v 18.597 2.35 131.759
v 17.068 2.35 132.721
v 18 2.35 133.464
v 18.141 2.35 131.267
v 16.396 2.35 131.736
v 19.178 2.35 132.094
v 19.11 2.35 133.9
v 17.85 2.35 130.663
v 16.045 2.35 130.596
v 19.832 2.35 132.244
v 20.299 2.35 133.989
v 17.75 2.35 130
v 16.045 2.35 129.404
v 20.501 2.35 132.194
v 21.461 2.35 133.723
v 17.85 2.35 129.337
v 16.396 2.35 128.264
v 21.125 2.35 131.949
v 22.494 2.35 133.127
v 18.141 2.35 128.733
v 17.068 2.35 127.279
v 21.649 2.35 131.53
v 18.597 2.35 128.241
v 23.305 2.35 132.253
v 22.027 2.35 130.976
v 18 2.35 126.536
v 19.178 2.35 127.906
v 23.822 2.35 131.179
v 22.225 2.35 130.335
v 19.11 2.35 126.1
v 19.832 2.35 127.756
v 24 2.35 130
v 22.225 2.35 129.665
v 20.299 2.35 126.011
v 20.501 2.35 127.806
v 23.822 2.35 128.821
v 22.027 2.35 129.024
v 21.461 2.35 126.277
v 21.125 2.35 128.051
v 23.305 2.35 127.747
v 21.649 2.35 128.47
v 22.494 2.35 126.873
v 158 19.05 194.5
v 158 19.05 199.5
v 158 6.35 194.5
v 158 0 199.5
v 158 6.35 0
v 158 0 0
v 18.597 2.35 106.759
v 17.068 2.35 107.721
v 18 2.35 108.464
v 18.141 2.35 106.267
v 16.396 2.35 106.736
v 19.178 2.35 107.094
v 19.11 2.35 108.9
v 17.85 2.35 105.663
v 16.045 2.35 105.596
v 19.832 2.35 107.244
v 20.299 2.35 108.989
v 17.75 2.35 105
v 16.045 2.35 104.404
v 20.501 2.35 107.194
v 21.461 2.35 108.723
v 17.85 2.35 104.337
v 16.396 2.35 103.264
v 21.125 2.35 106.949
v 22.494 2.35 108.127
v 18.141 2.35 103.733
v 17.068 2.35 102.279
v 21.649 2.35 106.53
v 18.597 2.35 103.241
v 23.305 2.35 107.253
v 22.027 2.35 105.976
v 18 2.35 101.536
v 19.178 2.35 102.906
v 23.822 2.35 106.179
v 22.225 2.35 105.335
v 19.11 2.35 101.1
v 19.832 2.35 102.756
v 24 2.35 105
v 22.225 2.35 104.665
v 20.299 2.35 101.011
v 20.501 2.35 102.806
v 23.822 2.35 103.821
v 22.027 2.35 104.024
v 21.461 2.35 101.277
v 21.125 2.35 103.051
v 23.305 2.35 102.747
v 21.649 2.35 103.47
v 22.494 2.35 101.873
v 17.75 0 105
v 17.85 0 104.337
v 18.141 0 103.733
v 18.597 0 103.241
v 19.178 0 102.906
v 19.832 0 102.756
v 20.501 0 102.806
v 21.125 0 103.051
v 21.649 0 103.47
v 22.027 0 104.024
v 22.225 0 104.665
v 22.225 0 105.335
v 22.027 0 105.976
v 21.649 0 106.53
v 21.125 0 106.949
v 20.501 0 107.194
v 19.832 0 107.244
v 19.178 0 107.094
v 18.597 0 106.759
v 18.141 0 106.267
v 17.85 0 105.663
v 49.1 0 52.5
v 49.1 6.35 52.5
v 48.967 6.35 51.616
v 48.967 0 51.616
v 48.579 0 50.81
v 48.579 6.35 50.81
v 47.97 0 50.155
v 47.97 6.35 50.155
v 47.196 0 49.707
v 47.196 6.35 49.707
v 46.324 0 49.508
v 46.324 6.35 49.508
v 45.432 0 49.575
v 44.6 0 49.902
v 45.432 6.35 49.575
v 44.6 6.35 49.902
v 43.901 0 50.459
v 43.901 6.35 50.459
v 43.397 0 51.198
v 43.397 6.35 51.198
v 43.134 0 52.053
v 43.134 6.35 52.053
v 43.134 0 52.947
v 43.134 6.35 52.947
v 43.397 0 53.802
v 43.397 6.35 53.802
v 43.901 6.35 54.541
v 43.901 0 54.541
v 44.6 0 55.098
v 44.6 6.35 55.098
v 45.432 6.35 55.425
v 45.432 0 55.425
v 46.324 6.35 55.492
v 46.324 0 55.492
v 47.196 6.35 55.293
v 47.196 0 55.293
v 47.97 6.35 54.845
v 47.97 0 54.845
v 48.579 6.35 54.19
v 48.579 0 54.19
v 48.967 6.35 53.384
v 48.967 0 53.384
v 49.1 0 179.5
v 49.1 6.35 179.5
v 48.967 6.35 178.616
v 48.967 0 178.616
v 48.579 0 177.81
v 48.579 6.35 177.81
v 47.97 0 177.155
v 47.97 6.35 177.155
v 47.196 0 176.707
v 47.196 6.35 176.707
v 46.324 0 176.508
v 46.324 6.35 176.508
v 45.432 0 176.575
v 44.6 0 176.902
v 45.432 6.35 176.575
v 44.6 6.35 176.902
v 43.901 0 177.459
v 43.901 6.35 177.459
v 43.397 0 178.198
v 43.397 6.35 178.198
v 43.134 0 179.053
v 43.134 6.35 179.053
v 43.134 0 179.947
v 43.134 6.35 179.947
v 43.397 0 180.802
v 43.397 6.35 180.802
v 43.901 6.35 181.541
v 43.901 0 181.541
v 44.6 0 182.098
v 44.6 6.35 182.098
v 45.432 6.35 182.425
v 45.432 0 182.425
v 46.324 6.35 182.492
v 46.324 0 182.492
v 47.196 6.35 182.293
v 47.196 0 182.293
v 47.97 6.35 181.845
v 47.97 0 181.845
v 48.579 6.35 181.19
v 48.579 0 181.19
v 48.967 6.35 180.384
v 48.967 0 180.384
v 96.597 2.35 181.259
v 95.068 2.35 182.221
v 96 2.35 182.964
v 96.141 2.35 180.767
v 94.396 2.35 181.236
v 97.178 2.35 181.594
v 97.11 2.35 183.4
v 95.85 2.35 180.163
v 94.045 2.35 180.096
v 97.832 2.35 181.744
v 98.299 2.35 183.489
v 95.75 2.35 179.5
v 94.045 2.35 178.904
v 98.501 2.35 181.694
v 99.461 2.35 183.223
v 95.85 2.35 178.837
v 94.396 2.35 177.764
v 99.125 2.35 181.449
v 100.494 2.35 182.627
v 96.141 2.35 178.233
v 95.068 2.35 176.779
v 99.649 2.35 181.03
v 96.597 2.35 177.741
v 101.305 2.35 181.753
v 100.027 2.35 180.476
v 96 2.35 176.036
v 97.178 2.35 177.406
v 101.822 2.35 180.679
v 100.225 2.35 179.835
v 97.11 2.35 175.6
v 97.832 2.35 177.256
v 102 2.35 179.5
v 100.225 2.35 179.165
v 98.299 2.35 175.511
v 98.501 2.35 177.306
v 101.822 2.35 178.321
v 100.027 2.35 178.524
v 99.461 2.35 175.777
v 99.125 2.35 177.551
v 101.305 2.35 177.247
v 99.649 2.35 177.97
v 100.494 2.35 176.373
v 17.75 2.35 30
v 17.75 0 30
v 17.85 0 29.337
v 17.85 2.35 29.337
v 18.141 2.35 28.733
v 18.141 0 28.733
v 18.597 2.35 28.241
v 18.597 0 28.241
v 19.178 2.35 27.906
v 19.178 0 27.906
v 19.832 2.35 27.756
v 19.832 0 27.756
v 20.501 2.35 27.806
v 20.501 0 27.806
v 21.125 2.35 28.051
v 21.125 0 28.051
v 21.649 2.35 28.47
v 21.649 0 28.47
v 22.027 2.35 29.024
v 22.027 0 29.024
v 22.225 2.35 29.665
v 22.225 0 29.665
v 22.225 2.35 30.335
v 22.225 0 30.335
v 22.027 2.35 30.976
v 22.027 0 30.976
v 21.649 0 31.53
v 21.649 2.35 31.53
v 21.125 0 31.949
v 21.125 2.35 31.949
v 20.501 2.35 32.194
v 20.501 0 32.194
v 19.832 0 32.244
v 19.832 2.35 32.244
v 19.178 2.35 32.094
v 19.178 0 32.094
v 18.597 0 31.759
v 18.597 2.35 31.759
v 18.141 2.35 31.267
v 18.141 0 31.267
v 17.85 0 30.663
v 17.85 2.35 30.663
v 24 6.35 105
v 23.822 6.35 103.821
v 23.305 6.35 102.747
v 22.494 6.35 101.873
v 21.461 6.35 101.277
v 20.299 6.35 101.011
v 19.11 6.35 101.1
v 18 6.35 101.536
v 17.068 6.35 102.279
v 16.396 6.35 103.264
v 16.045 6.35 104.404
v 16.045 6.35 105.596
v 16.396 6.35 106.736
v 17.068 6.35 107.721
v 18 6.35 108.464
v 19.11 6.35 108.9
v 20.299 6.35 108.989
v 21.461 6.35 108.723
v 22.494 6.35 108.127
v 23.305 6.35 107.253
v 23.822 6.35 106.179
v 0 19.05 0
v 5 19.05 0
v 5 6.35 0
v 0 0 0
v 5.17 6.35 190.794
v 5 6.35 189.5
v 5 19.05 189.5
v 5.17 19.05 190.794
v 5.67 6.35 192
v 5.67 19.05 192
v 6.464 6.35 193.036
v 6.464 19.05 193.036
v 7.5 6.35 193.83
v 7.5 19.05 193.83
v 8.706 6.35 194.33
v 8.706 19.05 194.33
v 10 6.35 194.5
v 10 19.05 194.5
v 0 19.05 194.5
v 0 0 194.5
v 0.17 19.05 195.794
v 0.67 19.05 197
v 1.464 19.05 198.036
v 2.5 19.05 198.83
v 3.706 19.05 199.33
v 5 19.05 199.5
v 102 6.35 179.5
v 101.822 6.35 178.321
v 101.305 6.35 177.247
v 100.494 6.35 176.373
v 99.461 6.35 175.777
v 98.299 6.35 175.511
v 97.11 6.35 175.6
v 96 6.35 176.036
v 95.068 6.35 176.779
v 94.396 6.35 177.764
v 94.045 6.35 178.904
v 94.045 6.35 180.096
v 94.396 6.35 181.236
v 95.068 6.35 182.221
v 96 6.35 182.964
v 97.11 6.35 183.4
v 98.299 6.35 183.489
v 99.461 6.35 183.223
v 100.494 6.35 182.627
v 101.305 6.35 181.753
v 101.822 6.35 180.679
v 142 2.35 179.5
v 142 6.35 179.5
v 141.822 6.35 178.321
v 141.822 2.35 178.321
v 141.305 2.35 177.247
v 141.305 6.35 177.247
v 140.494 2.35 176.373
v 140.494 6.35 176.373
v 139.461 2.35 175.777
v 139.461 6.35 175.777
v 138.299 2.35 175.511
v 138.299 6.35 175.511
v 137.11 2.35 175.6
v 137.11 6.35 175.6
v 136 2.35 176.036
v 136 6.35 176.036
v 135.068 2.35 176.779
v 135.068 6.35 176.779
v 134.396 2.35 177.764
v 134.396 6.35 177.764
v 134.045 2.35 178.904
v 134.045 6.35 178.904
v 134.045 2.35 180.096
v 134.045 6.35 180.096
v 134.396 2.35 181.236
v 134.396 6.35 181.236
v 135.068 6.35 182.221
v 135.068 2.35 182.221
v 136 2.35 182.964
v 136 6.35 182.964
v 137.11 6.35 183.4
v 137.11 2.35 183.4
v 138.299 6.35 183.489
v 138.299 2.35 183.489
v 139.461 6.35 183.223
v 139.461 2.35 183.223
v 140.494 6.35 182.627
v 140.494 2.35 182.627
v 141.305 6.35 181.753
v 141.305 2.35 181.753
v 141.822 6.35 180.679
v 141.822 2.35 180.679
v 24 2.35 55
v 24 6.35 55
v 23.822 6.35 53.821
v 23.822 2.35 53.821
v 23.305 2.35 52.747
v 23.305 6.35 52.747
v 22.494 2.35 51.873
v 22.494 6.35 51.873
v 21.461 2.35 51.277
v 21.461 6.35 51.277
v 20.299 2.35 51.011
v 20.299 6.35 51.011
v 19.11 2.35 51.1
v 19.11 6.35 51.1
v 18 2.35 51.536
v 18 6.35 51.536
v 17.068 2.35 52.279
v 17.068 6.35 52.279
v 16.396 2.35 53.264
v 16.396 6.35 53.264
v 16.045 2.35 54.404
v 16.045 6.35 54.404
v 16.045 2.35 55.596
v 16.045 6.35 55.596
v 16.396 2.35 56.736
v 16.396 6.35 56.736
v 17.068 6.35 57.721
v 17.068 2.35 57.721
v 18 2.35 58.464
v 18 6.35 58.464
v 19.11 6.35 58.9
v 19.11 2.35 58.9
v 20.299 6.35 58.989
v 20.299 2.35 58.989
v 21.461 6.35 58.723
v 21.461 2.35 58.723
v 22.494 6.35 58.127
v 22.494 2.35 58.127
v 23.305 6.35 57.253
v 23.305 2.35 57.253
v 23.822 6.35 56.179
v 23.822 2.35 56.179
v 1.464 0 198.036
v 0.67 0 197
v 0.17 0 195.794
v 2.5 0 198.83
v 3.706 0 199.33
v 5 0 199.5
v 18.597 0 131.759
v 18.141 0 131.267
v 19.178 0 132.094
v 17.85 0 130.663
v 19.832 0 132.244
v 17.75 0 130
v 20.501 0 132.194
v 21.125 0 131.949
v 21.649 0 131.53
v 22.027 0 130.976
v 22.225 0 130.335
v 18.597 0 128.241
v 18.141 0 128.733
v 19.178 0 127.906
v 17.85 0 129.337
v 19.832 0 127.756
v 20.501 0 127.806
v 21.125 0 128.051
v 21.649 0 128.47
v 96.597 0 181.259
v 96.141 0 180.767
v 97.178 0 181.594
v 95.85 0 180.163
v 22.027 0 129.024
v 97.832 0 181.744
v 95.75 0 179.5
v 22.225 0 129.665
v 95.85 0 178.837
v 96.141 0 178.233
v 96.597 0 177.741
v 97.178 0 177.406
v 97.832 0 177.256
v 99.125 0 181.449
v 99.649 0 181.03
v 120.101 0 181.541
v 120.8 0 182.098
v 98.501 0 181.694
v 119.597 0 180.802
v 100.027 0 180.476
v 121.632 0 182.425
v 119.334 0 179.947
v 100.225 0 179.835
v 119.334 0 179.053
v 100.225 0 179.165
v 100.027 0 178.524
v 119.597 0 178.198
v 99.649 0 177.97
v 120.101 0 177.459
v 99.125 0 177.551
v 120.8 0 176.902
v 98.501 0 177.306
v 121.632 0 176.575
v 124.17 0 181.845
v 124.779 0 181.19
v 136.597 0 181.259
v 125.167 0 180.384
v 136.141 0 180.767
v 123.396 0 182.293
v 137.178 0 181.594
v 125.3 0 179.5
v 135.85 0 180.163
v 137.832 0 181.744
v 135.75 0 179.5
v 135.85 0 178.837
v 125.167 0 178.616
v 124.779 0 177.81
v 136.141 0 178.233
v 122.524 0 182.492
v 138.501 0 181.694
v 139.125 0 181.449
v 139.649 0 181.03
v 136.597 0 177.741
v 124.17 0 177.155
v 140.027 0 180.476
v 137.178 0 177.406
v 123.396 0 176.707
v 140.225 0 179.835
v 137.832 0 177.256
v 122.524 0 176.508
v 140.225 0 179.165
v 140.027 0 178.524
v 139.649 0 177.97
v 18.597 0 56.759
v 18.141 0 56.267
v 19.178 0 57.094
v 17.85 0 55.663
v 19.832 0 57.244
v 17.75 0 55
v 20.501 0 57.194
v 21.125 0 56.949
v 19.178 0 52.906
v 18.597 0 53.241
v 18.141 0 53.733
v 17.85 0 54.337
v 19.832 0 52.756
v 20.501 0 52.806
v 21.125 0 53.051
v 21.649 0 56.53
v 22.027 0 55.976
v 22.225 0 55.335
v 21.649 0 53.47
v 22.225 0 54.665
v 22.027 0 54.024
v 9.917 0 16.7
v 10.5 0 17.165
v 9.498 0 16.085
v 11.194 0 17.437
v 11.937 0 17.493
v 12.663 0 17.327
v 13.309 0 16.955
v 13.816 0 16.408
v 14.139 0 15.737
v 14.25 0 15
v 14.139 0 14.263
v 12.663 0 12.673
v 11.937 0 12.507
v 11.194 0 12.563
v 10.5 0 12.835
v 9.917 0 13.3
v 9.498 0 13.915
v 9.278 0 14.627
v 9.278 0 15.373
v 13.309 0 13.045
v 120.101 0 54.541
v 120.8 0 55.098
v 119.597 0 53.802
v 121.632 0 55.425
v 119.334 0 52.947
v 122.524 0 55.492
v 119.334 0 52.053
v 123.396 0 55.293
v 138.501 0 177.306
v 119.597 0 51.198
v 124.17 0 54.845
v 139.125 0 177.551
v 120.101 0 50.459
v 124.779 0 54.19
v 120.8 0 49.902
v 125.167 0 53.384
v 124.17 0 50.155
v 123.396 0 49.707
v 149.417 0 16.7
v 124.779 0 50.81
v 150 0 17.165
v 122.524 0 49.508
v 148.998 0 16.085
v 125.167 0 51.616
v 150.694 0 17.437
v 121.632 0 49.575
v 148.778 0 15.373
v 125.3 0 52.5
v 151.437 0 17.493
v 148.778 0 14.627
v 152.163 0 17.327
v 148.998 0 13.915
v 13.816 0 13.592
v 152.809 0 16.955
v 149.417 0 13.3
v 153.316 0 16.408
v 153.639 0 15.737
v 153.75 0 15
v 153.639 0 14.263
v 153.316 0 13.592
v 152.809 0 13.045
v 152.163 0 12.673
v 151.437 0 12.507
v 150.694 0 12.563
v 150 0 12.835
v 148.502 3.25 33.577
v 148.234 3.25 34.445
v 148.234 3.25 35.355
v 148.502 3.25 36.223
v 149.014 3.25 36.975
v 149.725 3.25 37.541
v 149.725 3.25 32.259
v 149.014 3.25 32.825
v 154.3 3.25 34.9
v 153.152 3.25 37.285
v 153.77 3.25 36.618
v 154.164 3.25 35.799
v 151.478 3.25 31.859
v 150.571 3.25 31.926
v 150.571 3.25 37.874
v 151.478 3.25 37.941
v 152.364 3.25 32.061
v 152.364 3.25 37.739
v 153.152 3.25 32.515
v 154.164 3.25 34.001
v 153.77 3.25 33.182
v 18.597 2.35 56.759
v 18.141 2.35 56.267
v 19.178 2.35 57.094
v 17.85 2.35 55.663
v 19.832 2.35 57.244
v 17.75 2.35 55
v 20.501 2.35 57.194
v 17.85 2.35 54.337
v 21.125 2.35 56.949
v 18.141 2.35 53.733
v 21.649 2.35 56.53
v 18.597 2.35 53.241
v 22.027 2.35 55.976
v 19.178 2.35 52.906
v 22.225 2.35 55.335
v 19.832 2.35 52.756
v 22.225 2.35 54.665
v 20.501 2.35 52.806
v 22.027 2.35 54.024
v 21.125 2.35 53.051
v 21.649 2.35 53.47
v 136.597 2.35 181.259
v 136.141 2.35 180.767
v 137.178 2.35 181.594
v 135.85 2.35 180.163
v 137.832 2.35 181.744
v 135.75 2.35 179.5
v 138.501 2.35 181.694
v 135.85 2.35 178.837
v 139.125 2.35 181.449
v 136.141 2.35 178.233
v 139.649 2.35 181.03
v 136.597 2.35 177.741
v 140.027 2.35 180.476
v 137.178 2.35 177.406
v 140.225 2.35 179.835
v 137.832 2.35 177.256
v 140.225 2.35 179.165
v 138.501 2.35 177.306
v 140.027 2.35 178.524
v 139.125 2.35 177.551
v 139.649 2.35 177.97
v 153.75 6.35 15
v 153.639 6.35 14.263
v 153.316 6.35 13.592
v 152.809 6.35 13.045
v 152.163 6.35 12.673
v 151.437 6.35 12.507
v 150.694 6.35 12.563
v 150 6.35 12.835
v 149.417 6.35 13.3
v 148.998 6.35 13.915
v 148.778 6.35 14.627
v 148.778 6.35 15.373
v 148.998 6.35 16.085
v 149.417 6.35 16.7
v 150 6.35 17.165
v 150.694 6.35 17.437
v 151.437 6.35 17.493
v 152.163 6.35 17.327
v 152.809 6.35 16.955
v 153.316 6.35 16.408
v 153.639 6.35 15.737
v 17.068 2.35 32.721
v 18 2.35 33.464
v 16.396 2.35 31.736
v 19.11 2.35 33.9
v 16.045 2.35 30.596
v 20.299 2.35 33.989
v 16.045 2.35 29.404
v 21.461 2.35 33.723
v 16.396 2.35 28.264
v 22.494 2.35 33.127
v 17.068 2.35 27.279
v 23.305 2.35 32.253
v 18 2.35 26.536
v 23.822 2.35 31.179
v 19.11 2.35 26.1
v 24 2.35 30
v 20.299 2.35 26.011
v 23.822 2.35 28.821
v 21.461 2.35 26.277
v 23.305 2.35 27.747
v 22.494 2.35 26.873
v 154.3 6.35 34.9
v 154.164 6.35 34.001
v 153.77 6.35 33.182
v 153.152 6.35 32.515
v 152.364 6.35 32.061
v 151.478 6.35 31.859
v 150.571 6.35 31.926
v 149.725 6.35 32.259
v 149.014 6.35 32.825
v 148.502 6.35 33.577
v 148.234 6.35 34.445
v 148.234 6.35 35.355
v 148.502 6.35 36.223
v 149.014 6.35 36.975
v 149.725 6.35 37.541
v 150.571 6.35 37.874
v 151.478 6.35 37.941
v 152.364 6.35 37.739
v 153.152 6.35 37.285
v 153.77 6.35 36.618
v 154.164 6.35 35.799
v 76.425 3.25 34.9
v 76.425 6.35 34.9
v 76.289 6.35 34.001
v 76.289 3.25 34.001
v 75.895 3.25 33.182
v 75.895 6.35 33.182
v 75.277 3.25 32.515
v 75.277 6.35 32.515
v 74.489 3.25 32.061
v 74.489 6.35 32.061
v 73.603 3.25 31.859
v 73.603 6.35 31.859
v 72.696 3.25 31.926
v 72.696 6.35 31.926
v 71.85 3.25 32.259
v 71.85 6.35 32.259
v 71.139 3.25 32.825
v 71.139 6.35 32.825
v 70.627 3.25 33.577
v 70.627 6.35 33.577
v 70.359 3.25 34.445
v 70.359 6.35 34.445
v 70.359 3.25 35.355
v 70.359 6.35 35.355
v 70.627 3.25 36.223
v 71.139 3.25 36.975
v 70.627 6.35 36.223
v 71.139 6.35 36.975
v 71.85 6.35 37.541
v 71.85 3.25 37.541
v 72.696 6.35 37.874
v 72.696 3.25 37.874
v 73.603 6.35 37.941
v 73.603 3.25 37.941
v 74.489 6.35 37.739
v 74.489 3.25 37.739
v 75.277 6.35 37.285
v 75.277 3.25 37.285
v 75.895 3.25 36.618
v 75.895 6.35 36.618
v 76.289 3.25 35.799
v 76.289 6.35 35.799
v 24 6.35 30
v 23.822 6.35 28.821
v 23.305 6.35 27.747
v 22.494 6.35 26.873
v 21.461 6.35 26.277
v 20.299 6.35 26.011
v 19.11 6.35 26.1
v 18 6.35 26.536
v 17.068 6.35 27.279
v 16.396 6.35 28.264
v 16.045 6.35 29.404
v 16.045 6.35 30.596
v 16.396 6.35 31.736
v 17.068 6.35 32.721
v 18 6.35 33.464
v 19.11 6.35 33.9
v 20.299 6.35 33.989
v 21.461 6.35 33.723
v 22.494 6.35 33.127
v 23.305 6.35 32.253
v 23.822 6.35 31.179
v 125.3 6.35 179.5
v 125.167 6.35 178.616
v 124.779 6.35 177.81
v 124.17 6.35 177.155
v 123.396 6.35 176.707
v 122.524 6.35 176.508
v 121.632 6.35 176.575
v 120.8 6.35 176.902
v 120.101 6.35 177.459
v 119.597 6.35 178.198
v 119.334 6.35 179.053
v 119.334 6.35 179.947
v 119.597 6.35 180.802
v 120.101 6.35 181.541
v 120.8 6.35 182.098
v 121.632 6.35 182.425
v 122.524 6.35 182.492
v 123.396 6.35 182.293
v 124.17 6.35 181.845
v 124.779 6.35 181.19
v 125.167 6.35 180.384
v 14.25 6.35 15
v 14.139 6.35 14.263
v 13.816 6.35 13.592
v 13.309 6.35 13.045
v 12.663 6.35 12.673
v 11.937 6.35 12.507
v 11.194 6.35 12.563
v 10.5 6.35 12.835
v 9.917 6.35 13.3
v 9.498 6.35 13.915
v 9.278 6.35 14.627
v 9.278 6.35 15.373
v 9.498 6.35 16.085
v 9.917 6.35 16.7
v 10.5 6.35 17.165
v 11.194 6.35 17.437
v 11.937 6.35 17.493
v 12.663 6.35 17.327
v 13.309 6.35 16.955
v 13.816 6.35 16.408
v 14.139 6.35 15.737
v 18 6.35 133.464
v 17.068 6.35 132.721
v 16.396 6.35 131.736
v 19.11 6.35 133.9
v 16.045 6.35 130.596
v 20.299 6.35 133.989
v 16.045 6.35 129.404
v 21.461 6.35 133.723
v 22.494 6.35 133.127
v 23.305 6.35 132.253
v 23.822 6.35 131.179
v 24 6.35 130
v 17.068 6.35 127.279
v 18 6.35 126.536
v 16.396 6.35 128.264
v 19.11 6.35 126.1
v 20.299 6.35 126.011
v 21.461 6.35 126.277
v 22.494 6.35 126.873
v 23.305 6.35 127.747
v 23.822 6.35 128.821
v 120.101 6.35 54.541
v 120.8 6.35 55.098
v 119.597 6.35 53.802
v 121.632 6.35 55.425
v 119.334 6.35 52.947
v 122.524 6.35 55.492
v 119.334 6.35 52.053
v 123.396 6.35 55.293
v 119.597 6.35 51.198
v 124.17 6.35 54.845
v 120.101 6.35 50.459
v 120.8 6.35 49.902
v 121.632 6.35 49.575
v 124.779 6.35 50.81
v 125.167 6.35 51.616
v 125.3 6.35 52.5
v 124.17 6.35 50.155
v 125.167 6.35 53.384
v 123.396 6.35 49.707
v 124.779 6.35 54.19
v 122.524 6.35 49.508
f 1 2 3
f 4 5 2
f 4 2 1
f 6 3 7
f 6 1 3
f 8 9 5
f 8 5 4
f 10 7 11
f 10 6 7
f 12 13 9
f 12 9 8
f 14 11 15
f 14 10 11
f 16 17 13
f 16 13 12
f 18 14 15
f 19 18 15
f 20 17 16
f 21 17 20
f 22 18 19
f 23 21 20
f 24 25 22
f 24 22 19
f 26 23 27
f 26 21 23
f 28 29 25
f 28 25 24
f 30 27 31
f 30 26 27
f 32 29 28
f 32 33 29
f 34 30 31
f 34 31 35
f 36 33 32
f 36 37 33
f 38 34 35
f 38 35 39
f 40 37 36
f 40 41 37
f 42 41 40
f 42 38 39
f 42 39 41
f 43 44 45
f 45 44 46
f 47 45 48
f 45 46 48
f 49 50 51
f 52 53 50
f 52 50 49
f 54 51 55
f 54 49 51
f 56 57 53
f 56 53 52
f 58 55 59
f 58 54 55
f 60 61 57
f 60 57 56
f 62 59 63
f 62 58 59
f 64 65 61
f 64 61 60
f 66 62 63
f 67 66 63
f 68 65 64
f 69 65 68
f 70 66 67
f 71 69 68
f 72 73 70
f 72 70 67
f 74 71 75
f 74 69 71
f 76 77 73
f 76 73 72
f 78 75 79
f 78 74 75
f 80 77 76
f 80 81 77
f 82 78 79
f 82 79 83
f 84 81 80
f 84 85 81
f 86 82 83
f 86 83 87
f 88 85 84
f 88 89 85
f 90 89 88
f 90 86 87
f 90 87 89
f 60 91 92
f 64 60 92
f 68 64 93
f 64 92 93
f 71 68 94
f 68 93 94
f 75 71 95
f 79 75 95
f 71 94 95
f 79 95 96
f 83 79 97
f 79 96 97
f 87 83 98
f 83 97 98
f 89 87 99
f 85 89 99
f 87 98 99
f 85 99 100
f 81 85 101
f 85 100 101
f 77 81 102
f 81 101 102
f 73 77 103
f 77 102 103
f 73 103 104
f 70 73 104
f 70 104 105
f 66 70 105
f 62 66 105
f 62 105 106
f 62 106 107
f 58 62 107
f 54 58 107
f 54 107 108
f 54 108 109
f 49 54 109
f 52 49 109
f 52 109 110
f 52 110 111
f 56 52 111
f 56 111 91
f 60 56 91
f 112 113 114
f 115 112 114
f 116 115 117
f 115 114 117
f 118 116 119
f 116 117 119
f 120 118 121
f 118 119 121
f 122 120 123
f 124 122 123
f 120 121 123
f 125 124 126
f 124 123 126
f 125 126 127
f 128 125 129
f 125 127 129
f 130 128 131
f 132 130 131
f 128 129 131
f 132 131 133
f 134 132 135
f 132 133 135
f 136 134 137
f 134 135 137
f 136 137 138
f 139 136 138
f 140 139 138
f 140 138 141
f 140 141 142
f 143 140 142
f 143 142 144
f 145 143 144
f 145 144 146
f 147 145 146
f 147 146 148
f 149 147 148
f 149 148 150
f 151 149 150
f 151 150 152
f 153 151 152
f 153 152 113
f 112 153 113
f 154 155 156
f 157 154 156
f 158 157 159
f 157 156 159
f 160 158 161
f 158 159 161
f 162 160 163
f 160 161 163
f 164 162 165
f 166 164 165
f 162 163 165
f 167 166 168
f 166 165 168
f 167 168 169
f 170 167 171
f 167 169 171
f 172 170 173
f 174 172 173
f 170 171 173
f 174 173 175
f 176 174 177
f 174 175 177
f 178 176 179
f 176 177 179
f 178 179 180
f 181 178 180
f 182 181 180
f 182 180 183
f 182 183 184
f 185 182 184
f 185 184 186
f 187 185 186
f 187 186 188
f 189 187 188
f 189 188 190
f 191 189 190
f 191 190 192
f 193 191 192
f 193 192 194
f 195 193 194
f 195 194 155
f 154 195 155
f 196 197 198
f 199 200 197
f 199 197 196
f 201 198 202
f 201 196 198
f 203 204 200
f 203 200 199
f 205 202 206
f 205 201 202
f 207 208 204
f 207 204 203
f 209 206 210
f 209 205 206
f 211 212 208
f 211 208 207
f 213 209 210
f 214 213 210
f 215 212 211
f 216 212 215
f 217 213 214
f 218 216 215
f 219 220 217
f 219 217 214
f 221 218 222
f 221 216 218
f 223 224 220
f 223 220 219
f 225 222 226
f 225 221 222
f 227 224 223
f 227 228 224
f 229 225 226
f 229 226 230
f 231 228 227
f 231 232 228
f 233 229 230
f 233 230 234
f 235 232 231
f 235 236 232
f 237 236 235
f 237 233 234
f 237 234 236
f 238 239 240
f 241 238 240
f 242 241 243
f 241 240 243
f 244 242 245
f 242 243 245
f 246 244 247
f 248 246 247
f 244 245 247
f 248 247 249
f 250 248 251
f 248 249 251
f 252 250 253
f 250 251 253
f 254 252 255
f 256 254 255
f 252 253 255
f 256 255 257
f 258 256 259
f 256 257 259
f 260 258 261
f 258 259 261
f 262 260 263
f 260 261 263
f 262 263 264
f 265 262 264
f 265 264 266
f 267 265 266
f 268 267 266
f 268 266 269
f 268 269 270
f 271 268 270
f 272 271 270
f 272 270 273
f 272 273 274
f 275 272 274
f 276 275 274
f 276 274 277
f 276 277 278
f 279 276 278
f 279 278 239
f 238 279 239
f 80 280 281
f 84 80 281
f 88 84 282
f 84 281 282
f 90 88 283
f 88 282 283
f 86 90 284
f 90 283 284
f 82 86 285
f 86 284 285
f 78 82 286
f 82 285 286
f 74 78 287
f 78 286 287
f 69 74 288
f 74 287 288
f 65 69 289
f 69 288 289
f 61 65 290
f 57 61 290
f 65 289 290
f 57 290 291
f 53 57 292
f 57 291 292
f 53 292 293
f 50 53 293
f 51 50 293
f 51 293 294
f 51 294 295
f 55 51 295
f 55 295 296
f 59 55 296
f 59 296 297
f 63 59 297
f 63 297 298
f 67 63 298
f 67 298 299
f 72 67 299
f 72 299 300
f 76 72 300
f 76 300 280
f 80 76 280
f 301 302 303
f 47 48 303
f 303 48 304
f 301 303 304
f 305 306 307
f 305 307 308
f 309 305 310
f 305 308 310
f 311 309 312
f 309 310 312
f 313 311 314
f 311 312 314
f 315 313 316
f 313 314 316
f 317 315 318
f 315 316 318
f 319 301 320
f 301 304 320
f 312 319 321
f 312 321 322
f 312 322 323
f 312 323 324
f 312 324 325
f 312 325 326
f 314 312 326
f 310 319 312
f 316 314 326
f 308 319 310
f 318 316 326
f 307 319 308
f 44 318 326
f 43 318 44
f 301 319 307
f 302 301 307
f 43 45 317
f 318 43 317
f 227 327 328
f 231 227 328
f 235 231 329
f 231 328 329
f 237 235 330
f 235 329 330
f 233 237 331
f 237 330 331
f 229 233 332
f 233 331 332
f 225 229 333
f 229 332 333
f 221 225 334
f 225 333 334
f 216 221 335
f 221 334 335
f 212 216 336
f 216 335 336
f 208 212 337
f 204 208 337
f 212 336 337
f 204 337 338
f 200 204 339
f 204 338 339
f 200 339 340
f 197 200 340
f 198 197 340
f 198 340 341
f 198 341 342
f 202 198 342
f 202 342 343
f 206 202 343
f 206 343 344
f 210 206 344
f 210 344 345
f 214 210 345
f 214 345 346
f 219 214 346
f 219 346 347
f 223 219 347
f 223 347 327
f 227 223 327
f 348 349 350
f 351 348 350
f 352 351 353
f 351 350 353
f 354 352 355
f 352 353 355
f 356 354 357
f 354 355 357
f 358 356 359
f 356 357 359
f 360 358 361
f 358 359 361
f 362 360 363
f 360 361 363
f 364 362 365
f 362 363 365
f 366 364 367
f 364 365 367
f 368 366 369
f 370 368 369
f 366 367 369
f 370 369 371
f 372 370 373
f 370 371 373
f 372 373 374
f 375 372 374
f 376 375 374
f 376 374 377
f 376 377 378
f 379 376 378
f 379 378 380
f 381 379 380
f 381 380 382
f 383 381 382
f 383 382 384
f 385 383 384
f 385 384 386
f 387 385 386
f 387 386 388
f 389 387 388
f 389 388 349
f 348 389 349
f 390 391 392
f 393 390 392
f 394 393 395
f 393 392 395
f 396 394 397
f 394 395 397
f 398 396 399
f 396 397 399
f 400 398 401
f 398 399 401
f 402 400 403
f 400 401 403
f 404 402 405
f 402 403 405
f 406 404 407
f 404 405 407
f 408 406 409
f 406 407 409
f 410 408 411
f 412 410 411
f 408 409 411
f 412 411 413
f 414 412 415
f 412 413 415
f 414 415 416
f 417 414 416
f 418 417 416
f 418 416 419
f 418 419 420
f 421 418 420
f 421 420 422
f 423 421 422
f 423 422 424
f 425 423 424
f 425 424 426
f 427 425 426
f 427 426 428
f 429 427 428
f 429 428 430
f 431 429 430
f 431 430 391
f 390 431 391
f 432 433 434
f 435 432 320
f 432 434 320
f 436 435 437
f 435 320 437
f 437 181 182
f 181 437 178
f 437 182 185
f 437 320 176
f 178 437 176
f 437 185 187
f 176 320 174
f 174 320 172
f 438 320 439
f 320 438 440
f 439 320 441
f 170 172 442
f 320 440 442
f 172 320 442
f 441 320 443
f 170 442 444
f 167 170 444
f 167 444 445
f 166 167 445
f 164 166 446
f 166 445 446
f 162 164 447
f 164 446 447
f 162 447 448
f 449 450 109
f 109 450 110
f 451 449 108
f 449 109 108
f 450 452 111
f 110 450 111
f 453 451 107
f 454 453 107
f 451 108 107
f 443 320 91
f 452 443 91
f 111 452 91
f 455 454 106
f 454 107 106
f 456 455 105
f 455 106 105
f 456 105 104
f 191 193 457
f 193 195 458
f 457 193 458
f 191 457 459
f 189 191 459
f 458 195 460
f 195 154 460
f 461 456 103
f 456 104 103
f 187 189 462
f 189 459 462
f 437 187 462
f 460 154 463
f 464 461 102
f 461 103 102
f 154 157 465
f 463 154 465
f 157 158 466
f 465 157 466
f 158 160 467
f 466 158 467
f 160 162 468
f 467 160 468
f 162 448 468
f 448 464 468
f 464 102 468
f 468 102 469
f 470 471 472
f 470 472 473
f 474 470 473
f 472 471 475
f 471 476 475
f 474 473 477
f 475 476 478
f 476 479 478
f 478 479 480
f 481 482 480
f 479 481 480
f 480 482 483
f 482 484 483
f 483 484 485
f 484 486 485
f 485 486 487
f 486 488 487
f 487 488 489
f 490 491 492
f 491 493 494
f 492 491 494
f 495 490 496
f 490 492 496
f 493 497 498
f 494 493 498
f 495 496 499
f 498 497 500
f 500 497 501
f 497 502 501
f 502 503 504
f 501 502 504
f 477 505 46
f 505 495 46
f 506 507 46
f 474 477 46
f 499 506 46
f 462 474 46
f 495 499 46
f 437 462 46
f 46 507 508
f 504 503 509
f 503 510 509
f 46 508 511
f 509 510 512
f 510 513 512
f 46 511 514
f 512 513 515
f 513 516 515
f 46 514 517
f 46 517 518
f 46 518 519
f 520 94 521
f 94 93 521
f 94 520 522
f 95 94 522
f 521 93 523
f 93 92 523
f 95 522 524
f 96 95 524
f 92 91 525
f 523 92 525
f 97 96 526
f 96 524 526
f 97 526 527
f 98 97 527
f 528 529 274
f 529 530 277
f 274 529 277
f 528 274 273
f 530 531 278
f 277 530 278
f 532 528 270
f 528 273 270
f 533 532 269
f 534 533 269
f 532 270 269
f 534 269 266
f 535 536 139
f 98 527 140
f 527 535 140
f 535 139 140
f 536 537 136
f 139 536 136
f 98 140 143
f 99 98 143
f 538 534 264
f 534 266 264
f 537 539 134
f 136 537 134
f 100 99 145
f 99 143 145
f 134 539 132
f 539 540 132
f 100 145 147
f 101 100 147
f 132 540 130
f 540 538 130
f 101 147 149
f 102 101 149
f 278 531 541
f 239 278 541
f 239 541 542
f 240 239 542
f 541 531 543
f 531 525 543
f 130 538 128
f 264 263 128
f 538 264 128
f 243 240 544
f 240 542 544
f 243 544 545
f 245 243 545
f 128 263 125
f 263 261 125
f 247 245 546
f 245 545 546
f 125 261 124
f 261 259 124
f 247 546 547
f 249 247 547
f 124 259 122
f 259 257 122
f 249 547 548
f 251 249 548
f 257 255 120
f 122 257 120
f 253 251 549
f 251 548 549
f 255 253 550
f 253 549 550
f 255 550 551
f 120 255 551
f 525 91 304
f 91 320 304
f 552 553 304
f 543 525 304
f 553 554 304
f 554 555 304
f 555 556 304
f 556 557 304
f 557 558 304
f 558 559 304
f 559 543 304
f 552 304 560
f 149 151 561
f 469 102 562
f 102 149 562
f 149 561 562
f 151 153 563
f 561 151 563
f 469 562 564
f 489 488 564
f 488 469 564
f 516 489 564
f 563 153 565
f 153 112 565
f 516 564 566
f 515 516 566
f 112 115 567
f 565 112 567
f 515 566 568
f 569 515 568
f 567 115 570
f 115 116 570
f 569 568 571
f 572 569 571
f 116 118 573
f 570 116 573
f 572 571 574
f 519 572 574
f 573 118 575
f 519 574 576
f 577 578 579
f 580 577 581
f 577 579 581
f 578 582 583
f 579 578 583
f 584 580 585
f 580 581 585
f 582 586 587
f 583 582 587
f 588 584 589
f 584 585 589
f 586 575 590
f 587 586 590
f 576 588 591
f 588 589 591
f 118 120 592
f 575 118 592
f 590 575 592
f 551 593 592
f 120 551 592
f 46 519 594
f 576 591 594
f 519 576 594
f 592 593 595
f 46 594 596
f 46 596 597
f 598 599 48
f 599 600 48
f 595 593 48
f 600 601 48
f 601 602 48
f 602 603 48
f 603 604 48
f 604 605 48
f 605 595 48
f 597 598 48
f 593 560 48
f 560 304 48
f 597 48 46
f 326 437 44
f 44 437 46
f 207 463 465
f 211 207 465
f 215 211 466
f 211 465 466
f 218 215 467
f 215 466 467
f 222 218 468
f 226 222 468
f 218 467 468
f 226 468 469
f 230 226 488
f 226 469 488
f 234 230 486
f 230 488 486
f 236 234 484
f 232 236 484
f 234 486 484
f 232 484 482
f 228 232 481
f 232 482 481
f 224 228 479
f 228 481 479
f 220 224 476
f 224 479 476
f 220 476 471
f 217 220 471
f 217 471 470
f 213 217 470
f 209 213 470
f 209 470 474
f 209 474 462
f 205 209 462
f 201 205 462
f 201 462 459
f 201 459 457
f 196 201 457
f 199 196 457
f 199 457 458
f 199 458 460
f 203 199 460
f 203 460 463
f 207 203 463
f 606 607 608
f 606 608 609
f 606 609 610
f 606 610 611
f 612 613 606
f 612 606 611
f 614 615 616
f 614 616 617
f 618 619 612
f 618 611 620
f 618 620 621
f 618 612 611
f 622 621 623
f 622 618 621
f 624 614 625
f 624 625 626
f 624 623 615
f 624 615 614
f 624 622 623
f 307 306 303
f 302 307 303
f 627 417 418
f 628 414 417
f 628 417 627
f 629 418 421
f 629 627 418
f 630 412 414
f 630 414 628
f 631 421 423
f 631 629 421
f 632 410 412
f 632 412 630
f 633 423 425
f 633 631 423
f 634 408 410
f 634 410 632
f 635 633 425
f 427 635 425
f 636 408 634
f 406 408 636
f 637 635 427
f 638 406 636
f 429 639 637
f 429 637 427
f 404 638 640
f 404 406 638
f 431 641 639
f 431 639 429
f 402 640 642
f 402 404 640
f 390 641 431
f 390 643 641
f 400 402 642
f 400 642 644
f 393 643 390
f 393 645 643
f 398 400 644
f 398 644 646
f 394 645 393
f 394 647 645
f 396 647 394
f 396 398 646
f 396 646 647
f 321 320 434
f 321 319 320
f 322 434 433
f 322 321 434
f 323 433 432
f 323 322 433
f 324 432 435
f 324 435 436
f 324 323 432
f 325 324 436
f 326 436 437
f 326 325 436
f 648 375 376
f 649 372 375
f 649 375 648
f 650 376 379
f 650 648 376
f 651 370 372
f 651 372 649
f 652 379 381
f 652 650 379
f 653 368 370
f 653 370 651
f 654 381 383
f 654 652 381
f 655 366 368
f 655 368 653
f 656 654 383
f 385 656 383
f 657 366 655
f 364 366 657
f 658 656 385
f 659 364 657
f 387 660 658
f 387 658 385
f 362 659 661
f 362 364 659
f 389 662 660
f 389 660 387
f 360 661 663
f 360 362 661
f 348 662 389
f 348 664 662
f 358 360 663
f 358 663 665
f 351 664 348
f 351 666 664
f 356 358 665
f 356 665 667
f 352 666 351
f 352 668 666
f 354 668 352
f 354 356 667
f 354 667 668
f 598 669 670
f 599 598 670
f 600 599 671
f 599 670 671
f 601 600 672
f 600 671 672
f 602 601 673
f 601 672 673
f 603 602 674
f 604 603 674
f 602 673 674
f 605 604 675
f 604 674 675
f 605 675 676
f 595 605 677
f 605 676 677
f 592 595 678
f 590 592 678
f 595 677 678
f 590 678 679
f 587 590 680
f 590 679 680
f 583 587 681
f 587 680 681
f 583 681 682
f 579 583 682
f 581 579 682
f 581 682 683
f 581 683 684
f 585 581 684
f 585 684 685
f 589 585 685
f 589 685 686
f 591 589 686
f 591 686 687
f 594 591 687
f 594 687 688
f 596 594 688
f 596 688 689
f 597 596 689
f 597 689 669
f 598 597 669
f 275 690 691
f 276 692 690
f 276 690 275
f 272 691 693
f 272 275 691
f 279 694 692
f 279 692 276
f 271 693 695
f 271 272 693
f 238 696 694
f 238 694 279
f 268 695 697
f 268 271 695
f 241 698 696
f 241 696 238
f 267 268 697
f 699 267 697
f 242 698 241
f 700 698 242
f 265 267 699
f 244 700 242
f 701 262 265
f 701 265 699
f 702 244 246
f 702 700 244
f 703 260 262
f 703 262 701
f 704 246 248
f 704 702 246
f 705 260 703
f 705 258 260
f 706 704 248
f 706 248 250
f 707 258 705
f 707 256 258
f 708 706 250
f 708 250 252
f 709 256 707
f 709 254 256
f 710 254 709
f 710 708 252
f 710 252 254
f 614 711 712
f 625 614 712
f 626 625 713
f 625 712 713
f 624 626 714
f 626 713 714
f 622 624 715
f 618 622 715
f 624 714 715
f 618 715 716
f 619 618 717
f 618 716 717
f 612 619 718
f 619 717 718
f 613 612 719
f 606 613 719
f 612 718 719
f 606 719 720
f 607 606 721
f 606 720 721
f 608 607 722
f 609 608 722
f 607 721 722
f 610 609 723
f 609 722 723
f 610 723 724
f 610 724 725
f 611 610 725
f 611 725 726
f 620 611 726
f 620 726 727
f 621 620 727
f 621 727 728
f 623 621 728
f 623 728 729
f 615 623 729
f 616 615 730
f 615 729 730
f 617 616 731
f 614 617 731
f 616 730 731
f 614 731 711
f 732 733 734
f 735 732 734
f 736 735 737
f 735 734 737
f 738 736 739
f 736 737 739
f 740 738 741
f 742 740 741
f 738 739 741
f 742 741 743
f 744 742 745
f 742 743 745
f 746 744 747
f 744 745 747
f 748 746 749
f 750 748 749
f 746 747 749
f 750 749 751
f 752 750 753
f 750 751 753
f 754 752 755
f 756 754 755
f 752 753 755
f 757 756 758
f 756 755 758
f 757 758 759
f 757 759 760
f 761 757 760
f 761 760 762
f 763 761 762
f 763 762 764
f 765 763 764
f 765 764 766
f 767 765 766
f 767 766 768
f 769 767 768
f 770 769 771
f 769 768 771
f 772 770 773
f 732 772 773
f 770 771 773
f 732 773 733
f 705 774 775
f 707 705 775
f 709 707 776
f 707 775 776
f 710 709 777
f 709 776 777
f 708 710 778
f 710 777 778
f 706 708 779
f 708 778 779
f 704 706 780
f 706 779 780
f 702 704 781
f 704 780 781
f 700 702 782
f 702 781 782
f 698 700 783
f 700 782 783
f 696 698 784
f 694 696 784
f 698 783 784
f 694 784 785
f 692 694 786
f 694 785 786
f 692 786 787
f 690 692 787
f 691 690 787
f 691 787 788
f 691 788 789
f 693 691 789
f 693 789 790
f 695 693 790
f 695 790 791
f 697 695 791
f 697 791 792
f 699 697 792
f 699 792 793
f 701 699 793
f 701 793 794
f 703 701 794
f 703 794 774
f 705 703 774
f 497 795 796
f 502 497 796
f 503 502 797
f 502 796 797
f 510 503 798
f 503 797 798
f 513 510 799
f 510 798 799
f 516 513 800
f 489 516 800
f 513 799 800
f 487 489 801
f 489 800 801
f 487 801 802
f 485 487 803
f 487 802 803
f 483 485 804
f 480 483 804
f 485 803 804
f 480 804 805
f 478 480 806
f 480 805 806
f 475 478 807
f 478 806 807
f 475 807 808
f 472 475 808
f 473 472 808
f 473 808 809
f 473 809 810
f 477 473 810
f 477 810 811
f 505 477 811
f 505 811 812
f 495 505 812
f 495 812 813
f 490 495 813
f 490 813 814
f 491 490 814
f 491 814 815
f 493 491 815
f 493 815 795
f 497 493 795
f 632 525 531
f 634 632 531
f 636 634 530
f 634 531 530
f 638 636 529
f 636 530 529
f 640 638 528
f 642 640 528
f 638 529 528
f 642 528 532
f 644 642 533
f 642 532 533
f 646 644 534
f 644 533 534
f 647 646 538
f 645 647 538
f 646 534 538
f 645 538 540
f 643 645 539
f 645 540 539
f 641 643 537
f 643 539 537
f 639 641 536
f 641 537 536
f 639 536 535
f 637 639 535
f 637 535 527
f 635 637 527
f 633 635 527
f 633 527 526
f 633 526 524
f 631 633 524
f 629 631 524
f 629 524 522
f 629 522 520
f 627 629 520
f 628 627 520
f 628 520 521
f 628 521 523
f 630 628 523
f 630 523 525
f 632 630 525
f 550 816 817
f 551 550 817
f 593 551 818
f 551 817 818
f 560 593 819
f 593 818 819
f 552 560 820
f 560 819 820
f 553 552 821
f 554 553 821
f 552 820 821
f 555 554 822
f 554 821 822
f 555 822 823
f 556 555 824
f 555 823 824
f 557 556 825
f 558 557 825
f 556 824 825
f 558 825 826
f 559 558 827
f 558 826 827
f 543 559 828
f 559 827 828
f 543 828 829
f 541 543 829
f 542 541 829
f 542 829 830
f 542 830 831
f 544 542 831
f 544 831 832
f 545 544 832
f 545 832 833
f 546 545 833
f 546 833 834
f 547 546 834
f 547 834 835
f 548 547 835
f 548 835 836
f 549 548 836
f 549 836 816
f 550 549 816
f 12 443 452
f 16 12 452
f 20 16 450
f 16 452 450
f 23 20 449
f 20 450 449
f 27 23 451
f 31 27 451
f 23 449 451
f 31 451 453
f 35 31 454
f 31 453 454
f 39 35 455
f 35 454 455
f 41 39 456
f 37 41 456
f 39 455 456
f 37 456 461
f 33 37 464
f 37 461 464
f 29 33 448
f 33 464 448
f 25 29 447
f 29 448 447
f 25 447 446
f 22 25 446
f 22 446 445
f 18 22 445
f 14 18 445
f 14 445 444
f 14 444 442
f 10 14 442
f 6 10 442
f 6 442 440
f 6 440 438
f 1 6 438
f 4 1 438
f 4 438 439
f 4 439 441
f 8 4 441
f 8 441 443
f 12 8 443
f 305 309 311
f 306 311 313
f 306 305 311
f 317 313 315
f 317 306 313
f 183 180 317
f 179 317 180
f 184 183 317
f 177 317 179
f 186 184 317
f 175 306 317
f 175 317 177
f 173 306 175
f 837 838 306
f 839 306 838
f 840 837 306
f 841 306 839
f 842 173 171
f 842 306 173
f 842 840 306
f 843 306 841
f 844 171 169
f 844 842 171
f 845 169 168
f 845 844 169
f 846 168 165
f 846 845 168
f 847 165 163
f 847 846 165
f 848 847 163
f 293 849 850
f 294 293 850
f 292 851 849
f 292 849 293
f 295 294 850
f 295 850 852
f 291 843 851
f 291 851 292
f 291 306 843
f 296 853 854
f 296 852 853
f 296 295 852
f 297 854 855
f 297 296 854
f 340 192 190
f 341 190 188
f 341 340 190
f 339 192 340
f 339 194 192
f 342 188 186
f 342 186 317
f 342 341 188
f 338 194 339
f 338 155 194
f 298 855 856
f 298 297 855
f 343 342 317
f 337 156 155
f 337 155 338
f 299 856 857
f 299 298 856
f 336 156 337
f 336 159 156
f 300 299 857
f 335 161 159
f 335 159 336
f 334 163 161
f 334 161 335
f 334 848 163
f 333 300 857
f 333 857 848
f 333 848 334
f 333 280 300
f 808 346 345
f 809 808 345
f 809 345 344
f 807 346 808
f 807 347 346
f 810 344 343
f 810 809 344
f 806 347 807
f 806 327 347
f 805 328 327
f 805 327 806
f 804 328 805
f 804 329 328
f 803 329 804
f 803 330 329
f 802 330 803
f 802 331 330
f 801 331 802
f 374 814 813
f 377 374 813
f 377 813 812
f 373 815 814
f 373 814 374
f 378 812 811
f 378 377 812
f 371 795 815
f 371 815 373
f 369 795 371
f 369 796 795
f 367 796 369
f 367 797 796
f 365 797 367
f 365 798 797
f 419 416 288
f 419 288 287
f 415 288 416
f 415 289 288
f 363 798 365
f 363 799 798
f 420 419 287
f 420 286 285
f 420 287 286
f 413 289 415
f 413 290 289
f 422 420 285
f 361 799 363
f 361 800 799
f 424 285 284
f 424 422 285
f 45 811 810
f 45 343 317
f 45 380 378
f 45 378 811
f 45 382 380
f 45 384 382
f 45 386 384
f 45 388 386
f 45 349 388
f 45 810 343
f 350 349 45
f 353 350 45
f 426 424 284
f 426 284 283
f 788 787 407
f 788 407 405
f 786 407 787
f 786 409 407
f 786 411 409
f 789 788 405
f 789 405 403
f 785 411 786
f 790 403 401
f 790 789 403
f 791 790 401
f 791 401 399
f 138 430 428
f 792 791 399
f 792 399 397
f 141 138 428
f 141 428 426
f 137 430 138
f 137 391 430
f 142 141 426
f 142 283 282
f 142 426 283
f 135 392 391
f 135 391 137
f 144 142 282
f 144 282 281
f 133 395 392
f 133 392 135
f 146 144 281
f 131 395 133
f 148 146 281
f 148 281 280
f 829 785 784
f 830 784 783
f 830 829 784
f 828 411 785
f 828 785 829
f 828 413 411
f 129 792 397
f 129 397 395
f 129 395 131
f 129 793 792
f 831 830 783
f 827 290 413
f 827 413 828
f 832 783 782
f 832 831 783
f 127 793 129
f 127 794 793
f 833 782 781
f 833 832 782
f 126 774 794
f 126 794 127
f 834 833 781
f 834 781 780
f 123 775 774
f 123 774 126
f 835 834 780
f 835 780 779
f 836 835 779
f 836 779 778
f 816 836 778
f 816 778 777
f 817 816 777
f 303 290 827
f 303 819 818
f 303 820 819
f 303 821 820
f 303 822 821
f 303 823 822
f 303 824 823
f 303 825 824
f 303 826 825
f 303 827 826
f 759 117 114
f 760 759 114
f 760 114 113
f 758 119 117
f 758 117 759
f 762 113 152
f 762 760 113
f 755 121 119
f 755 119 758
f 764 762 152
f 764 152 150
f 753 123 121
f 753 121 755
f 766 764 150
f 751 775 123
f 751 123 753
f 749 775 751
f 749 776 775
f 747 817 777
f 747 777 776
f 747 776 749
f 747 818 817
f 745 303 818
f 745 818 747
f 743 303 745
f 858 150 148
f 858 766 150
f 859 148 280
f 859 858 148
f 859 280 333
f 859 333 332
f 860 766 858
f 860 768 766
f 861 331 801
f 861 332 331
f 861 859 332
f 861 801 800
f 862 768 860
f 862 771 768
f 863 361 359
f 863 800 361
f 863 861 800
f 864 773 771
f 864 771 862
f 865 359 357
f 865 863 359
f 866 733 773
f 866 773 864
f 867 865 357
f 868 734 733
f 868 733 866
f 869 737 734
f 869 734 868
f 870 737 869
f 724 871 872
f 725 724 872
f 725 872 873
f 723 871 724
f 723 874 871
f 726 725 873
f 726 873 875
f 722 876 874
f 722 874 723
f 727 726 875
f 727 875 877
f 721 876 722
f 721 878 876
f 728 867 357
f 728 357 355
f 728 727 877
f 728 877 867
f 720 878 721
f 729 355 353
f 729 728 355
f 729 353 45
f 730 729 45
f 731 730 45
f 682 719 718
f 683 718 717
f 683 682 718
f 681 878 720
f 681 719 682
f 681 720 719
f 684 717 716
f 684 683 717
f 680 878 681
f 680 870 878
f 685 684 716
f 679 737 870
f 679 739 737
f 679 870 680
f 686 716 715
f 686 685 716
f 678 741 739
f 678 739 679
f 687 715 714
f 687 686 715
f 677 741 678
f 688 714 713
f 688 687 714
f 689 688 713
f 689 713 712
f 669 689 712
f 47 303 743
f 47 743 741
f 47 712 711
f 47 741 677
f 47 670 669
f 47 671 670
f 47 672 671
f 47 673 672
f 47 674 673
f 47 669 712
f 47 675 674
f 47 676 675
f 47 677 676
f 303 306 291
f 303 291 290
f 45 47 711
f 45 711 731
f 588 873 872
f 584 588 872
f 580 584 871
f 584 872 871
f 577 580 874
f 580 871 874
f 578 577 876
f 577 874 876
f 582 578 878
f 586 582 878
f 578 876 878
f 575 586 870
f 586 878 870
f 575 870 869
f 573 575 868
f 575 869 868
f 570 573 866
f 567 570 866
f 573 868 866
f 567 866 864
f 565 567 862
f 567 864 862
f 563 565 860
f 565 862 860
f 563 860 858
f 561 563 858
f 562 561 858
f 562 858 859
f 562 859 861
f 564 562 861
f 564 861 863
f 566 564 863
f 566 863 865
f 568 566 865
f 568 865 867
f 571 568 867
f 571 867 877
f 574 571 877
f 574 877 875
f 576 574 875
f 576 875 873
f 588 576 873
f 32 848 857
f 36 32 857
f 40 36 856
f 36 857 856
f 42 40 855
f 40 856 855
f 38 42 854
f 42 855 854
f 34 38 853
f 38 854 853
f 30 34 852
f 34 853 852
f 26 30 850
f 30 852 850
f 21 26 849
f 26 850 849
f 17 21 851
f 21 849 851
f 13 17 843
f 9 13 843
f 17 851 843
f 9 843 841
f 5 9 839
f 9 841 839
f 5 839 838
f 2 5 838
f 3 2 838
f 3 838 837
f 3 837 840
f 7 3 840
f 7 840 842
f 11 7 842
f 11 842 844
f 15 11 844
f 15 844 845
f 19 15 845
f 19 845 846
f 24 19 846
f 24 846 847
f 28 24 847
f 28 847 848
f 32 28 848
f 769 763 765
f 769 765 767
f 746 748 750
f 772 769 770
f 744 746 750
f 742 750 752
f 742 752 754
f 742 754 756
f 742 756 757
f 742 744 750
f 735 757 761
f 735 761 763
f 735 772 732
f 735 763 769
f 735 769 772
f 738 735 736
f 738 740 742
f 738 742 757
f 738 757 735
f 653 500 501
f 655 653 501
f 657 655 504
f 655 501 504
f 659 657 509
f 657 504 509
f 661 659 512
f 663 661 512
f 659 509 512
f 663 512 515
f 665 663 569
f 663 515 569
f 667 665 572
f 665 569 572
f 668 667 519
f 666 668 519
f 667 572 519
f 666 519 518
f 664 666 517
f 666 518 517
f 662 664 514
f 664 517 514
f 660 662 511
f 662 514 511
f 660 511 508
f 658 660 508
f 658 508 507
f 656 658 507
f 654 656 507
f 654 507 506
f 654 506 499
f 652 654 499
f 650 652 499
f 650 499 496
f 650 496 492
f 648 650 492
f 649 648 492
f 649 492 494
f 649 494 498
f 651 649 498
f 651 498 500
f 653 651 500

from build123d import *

# Parameters (mm, degrees)
SKETCH1_W                      = 158
SKETCH1_H                      = 199.5
BOSS_EXTRUDE1_DEPTH            = 6.35
BOSS_EXTRUDE2_DEPTH            = 12.7
CBORE_FOR_M4_SHCS1_D           = 4.5
CBORE_FOR_M4_SHCS1_DEPTH       = 6.35
CBORE_FOR_M4_SHCS1_CBORE_D     = 8
CBORE_FOR_M4_SHCS1_CBORE_DEPTH = 4
FILLET2_R                      = 5
SKETCH8_R                      = 3
ENCLOSURE_MOUNT_DEPTH          = 7.35
SKETCH9_R                      = 2.5
FUSE_MOUNT_DEPTH               = 7.35
SKETCH10_R                     = 3.05
MAGNETS_DEPTH                  = 3.1


with BuildPart() as part:
    # Sketch1 → Boss-Extrude1 (new body)
    with BuildSketch(Plane(origin=(0, 0, 0), x_dir=(1, 0, 0), z_dir=(0, 1, 0))):
        with Locations((79, -99.75)):
            Rectangle(SKETCH1_W, SKETCH1_H)
    extrude(amount=BOSS_EXTRUDE1_DEPTH)

    # Sketch3 → Boss-Extrude2 (add)
    with BuildSketch(Plane(origin=(0, 6.35, 0), x_dir=(1, 0, 0), z_dir=(0, 1, 0))):
        Polygon((0, 0), (0, -199.5), (158, -199.5), (158, -194.5), (5, -194.5), (5, 0), align=None)
    extrude(amount=BOSS_EXTRUDE2_DEPTH)

    # CBORE for M4 SHCS1
    with Locations(Plane(origin=(0, 6.35, 0), x_dir=(1, 0, 0), z_dir=(0, 1, 0))):
        with Locations((20, -55), (98, -179.5), (138, -179.5), (20, -130), (20, -105), (20, -30)):
            CounterBoreHole(CBORE_FOR_M4_SHCS1_D / 2, CBORE_FOR_M4_SHCS1_CBORE_D / 2, CBORE_FOR_M4_SHCS1_CBORE_DEPTH, depth=CBORE_FOR_M4_SHCS1_DEPTH)

    # Fillet2
    fillet2_edges = [part.edges().sort_by_distance(p)[0] for p in [
        (5, 12.7, 194.5),
        (0, 9.525, 199.5),
    ]]
    fillet(fillet2_edges, radius=FILLET2_R)

    # Sketch8 → Enclosure Mount (cut, through all)
    with BuildSketch(Plane(origin=(0, 6.35, 0), x_dir=(1, 0, 0), z_dir=(0, 1, 0))):
        with Locations((46.1, -52.5)):
            Circle(SKETCH8_R)
        with Locations((122.3, -52.5)):
            Circle(SKETCH8_R)
        with Locations((122.3, -179.5)):
            Circle(SKETCH8_R)
        with Locations((46.1, -179.5)):
            Circle(SKETCH8_R)
    extrude(amount=-ENCLOSURE_MOUNT_DEPTH, mode=Mode.SUBTRACT)

    # Sketch9 → Fuse Mount (cut, through all)
    with BuildSketch(Plane(origin=(0, 6.35, 0), x_dir=(1, 0, 0), z_dir=(0, 1, 0))):
        with Locations((11.75, -15)):
            Circle(SKETCH9_R)
        with Locations((151.25, -15)):
            Circle(SKETCH9_R)
    extrude(amount=-FUSE_MOUNT_DEPTH, mode=Mode.SUBTRACT)

    # Sketch10 → Magnets (cut)
    with BuildSketch(Plane(origin=(0, 6.35, 0), x_dir=(1, 0, 0), z_dir=(0, 1, 0))):
        with Locations((151.25, -34.9)):
            Circle(SKETCH10_R)
        with Locations((73.375, -34.9)):
            Circle(SKETCH10_R)
    extrude(amount=-MAGNETS_DEPTH, mode=Mode.SUBTRACT)


solid = part.part
